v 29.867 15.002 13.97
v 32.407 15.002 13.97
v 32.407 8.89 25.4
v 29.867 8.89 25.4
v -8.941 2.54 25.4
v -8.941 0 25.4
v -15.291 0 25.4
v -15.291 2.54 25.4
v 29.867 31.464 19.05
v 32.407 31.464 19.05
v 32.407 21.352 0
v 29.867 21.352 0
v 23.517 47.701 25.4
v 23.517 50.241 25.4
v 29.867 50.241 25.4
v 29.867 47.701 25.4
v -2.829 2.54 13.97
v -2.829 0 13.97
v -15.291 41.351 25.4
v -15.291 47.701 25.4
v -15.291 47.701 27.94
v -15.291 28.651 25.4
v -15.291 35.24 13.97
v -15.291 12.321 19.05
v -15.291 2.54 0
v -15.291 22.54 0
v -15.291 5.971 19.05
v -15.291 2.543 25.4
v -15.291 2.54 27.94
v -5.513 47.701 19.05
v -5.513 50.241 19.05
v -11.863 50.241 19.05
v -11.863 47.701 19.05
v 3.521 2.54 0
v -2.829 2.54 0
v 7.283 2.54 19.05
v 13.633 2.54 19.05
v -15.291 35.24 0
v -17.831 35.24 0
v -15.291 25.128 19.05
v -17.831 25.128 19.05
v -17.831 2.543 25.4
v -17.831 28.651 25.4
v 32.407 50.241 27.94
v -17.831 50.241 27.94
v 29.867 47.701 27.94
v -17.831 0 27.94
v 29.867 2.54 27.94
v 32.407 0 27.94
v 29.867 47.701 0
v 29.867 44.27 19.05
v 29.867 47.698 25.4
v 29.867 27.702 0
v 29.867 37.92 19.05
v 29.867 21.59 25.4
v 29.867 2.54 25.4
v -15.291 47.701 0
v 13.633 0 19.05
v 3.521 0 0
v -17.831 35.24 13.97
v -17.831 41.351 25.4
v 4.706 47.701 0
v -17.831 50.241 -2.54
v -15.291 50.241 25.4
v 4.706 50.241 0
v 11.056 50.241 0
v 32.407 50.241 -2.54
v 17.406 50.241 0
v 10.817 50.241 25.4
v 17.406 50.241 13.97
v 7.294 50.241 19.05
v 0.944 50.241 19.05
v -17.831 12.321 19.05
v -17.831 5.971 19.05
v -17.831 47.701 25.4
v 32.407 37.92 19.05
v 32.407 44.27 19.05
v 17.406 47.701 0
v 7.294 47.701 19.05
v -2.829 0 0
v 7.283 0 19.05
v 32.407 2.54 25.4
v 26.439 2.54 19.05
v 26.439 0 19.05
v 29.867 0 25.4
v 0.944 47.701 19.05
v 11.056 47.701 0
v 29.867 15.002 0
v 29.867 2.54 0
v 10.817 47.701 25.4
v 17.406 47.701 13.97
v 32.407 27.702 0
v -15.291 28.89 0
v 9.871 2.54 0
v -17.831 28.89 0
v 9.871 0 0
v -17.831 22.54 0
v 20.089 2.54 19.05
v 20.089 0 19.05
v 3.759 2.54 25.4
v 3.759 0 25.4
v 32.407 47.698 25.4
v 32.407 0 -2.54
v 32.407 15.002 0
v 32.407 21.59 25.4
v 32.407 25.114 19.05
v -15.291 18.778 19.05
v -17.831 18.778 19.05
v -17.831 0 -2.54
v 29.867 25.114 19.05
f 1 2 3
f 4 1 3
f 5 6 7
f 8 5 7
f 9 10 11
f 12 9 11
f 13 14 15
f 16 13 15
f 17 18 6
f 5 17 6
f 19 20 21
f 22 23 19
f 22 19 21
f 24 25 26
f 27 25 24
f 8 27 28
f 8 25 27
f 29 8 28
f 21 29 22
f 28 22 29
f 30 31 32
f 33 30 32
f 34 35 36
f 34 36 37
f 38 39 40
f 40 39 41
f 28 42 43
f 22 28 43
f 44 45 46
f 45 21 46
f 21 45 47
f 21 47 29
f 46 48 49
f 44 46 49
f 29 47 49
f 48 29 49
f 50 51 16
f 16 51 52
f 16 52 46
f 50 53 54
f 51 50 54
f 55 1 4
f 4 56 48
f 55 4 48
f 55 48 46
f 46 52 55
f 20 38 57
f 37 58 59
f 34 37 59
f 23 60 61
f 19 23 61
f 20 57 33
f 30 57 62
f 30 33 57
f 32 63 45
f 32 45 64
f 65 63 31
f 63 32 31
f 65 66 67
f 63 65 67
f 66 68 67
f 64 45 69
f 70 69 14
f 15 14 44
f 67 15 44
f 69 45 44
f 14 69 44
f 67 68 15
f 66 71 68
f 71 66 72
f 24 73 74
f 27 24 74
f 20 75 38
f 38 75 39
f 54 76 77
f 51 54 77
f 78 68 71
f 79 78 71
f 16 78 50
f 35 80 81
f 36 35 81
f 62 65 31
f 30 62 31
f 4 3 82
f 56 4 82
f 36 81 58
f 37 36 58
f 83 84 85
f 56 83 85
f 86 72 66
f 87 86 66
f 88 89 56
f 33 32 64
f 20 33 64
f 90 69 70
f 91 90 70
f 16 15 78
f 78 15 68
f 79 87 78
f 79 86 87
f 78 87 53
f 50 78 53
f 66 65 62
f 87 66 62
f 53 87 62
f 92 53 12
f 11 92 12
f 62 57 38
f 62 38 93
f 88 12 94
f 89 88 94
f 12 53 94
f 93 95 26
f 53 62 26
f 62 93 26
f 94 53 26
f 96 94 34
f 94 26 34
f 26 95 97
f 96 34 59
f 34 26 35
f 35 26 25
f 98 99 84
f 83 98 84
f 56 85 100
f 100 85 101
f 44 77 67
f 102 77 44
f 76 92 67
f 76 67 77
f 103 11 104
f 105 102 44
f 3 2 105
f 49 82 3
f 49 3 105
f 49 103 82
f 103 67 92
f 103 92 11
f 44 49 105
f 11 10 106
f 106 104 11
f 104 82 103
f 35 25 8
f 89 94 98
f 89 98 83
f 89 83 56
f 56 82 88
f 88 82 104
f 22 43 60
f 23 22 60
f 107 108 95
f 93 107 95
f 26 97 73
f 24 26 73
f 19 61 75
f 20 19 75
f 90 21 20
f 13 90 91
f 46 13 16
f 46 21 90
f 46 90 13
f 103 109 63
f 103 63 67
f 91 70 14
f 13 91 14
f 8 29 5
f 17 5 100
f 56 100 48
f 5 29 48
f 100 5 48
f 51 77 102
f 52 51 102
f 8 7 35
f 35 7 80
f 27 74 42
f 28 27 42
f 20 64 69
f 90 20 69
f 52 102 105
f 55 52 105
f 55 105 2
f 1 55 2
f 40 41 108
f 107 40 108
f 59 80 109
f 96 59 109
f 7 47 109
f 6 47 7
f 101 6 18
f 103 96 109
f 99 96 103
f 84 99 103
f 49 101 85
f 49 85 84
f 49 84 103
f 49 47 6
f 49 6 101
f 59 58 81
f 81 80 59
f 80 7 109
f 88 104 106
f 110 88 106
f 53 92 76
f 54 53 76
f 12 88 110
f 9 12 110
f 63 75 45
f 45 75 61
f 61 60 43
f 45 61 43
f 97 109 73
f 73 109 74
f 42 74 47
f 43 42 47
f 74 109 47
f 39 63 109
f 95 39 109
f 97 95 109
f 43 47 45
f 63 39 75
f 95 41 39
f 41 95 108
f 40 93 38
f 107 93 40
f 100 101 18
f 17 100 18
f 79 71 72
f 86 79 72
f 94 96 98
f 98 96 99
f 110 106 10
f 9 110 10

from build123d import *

# Parameters (mm, degrees)
F1_W      = 50.238024
F1_H      = 30.48
F2_DEPTH  = 50.2412
F4_T      = -2.54
F7_DEPTH  = 2.54
F8_DEPTH  = 2.54
F9_DEPTH  = 2.54
F10_DEPTH = 2.54


with BuildPart() as f2:
    # F1 (on Front) → F2 (new body)
    with BuildSketch(Plane.XZ):
        with Locations((7.288118, 12.7)):
            Rectangle(F1_W, F1_H)
    extrude(amount=-F2_DEPTH)

    # F4
    f4_openings = [f2.faces().sort_by_distance(p)[0] for p in [
        (7.288118, 25.1206, 27.94),
    ]]
    offset(amount=F4_T, openings=f4_openings)

    # F0 (on Front) → F7 (cut)
    with BuildSketch(Plane.XZ):
        Polygon((-8.940894, 25.4), (-15.290894, 25.4), (-2.829347, 0), (7.282625, 19.05), (13.632625, 19.05), (3.520653, 0), (9.870653, 0), (20.089414, 19.05), (26.439414, 19.05), (29.86713, 25.4), (3.759106, 25.4), (-2.829347, 13.97), align=None)
    extrude(amount=-F7_DEPTH, mode=Mode.SUBTRACT)

    # F6 (on face) → F8 (cut)
    with BuildSketch(Plane(origin=(-17.830894, 0, 0), x_dir=(0, -1, 0), z_dir=(-1, 0, 0))):
        Polygon((-41.3512, 25.4), (-47.7012, 25.4), (-35.239653, 0), (-25.127682, 19.05), (-18.777682, 19.05), (-28.889653, 0), (-22.539653, 0), (-12.320892, 19.05), (-5.970892, 19.05), (-2.543176, 25.4), (-28.6512, 25.4), (-35.239653, 13.97), align=None)
    extrude(amount=-F8_DEPTH, mode=Mode.SUBTRACT)

    # F5 (on face) → F9 (cut)
    with BuildSketch(Plane(origin=(0, 50.2412, 0), x_dir=(-1, 0, 0), z_dir=(0, 1, 0))):
        Polygon((-23.51713, 25.4), (-29.86713, 25.4), (-17.405583, 0), (-7.293612, 19.05), (-0.943612, 19.05), (-11.055583, 0), (-4.705583, 0), (5.513178, 19.05), (11.863178, 19.05), (15.290894, 25.4), (-10.81713, 25.4), (-17.405583, 13.97), align=None)
    extrude(amount=-F9_DEPTH, mode=Mode.SUBTRACT)

    # F3 (on face) → F10 (cut)
    with BuildSketch(Plane.YZ.offset(32.40713)):
        Polygon((8.89, 25.4), (2.54, 25.4), (15.001547, 0), (25.113518, 19.05), (31.463518, 19.05), (21.351547, 0), (27.701547, 0), (37.920308, 19.05), (44.270308, 19.05), (47.698024, 25.4), (21.59, 25.4), (15.001547, 13.97), align=None)
    extrude(amount=-F10_DEPTH, mode=Mode.SUBTRACT)


solid = f2.part
